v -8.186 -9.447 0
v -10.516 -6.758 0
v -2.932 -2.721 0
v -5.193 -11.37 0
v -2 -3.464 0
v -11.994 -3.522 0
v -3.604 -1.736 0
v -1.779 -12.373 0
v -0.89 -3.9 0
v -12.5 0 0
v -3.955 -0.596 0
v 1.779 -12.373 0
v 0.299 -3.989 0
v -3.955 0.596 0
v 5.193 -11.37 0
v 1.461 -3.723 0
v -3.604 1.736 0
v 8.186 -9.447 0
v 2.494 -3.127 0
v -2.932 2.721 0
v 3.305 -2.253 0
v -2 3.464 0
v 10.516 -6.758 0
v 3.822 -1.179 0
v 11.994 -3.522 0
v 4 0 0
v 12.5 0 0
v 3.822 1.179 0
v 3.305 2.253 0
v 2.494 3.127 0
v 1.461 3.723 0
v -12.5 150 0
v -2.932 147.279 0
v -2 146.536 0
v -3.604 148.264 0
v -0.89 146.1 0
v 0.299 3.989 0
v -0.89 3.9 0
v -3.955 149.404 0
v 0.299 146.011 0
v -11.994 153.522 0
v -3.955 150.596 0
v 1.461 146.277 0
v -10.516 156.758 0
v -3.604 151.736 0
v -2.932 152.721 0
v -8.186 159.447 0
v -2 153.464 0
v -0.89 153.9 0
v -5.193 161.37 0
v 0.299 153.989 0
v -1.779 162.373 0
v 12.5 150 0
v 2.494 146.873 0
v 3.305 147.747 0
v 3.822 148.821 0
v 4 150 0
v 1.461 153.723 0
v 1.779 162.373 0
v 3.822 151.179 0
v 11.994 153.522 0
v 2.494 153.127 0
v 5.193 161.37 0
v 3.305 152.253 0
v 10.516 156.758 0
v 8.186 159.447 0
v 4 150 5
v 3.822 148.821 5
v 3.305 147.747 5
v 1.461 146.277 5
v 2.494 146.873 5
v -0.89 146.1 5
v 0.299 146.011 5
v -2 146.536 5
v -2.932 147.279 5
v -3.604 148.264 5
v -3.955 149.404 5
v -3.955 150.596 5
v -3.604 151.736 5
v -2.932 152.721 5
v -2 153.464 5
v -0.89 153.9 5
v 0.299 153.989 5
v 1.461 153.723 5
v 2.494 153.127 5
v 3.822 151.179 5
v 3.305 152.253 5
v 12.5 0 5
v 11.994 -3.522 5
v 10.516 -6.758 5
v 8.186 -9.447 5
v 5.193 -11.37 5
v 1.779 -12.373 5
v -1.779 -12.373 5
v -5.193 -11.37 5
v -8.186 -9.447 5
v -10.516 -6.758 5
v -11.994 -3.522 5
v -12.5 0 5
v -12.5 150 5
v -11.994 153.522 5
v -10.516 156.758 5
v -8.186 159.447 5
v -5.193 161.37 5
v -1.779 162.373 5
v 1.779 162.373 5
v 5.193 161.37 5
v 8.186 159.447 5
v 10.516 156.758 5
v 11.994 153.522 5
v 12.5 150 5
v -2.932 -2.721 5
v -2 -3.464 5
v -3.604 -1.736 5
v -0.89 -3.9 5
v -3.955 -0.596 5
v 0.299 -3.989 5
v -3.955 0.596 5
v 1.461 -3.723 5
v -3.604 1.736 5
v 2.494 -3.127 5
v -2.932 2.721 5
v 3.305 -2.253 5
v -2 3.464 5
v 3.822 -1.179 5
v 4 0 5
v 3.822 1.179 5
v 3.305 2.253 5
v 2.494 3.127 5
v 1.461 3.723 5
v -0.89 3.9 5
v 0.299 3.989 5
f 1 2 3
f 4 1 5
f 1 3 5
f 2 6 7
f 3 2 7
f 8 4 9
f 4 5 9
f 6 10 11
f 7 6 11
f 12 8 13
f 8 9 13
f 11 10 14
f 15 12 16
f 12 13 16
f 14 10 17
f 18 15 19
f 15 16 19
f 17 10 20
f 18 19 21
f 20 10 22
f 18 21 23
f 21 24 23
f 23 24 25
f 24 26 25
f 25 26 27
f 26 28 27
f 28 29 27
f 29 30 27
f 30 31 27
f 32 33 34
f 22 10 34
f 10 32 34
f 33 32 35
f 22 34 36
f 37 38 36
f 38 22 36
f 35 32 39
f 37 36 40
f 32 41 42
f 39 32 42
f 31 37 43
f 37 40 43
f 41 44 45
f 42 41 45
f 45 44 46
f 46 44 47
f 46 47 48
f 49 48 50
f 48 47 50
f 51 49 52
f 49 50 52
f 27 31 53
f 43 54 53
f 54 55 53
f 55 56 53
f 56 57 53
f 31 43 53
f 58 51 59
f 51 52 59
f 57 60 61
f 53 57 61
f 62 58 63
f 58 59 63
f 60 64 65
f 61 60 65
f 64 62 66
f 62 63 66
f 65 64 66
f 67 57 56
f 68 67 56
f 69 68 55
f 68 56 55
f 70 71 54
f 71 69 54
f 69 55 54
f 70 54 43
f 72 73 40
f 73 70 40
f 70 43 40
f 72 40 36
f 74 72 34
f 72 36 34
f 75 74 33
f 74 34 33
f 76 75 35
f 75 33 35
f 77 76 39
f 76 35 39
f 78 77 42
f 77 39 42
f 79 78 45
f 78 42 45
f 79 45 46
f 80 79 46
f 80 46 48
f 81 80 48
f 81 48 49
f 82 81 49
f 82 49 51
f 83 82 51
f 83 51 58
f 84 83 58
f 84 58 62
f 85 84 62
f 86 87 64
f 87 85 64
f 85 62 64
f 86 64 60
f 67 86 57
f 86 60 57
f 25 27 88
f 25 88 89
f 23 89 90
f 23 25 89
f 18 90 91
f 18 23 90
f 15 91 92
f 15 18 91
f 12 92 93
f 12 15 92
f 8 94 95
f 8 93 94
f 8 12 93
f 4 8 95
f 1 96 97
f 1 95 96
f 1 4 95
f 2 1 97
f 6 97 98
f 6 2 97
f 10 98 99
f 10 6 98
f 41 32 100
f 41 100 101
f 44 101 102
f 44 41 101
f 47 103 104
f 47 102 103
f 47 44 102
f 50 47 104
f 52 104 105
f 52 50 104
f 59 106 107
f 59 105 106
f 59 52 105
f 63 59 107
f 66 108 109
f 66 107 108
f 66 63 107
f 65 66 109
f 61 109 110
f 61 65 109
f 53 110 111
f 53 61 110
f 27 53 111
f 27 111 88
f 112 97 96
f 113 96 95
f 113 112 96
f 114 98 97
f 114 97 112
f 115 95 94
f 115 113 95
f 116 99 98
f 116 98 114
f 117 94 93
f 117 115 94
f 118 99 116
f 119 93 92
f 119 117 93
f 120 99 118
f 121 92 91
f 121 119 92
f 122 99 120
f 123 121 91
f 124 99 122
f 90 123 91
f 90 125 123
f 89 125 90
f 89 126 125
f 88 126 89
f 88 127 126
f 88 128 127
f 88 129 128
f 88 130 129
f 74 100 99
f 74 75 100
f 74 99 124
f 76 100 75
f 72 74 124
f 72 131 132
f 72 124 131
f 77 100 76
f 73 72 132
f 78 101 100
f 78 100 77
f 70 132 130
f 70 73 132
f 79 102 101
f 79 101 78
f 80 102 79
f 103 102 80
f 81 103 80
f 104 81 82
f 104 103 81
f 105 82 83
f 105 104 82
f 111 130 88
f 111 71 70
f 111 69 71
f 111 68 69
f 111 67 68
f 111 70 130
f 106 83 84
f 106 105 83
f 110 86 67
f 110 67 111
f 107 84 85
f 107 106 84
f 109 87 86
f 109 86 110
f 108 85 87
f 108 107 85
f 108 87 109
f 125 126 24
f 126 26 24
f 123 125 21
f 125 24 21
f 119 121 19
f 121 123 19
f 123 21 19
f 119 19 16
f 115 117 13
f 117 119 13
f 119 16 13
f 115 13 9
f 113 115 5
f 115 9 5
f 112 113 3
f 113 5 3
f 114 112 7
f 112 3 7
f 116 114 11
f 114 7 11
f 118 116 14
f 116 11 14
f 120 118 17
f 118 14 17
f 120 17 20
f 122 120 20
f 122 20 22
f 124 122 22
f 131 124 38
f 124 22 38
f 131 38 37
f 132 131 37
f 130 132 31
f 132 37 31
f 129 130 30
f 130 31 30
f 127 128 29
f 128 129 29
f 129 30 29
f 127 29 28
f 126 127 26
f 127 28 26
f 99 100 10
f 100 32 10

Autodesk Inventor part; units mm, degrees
ref_plane "YZ Plane" through (0, 0, 0) normal (1, 0, 0) x (0, 1, 0)
ref_plane "XZ Plane" through (0, 0, 0) normal (0, 1, 0) x (-1, 0, 0)
ref_plane "XY Plane" through (0, 0, 0) normal (0, 0, 1) x (1, 0, 0)
sketch "Sketch1" plane through (0, 0, 0) normal (0, 0, 1) x (1, 0, 0)
  circle A0 centre (0, 0) radius 4
  circle A1 centre (0, 0) radius 12.5
  circle A2 centre (0, 150) radius 4
  circle A3 centre (0, 150) radius 12.5
  line L0 (-12.5, 150) -> (-12.5, 0)
  line L1 (12.5, 150) -> (12.5, 0)
  dimension "d0" = 8
  dimension "d1" = 25
  dimension "d2" = 8
  dimension "d3" = 25
  dimension "d4" = 150
  dimension "d5" = 0
extrude "Extrusion1" add sketch "Sketch1" along normal blind 5
equation "\"d2\" = d0"
equation "\"d3\" = d1"
properties part number "cięgno silnika platformy"
